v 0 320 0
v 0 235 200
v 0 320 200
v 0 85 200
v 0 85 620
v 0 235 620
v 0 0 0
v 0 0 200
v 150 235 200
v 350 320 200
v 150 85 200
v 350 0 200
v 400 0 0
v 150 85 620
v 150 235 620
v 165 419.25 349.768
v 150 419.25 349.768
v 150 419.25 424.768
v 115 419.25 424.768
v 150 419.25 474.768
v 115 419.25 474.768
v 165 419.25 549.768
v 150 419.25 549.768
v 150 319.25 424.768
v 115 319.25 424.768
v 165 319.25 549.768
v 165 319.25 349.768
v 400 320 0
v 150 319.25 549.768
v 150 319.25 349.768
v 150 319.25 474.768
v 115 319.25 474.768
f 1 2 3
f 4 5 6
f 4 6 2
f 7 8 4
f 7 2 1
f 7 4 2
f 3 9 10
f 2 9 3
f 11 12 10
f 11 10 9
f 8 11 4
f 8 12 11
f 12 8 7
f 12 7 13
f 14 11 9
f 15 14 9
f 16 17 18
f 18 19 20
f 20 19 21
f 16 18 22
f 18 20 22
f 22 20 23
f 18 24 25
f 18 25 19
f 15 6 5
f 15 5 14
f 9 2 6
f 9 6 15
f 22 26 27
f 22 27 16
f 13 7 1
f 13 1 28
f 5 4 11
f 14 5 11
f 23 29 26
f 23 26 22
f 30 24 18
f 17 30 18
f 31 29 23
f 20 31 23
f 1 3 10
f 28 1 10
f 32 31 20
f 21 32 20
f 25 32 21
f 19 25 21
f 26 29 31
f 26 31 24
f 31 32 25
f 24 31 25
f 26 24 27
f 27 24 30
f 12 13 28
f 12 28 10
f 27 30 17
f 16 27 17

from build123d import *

# Parameters (mm, degrees)
F1_DEPTH = 320
F2_W     = 150
F2_H     = 150
F3_DEPTH = 420
F4_W     = 100
F4_H     = 75
F4_H_2   = 50
F5_DEPTH = 15
F6_DEPTH = 35


with BuildPart() as f1:
    # F0 (on Front) → F1 (new body)
    with BuildSketch(Plane.XZ):
        Polygon((0, 200), (0, 0), (400, 0), (350, 200), align=None)
    extrude(amount=-F1_DEPTH)

    # F2 (on face) → F3 (join)
    with BuildSketch(Plane.XY.offset(200)):
        with Locations((75, 160)):
            Rectangle(F2_W, F2_H)
    extrude(amount=F3_DEPTH)


with BuildPart() as f5:
    # F4 (on face) → F5 (new body)
    with BuildSketch(Plane.YZ.offset(150)):
        with Locations((369.25047, 512.267625)):
            Rectangle(F4_W, F4_H)
        with Locations((369.25047, 387.267625)):
            Rectangle(F4_W, F4_H)
        with Locations((369.25047, 449.767625)):
            Rectangle(F4_W, F4_H_2)
    extrude(amount=F5_DEPTH)

    # F4 (on face) → F6 (join)
    with BuildSketch(Plane.YZ.offset(150)):
        with Locations((369.25047, 449.767625)):
            Rectangle(F4_W, F4_H_2)
    extrude(amount=-F6_DEPTH)


solid = Compound([f1.part, f5.part])
